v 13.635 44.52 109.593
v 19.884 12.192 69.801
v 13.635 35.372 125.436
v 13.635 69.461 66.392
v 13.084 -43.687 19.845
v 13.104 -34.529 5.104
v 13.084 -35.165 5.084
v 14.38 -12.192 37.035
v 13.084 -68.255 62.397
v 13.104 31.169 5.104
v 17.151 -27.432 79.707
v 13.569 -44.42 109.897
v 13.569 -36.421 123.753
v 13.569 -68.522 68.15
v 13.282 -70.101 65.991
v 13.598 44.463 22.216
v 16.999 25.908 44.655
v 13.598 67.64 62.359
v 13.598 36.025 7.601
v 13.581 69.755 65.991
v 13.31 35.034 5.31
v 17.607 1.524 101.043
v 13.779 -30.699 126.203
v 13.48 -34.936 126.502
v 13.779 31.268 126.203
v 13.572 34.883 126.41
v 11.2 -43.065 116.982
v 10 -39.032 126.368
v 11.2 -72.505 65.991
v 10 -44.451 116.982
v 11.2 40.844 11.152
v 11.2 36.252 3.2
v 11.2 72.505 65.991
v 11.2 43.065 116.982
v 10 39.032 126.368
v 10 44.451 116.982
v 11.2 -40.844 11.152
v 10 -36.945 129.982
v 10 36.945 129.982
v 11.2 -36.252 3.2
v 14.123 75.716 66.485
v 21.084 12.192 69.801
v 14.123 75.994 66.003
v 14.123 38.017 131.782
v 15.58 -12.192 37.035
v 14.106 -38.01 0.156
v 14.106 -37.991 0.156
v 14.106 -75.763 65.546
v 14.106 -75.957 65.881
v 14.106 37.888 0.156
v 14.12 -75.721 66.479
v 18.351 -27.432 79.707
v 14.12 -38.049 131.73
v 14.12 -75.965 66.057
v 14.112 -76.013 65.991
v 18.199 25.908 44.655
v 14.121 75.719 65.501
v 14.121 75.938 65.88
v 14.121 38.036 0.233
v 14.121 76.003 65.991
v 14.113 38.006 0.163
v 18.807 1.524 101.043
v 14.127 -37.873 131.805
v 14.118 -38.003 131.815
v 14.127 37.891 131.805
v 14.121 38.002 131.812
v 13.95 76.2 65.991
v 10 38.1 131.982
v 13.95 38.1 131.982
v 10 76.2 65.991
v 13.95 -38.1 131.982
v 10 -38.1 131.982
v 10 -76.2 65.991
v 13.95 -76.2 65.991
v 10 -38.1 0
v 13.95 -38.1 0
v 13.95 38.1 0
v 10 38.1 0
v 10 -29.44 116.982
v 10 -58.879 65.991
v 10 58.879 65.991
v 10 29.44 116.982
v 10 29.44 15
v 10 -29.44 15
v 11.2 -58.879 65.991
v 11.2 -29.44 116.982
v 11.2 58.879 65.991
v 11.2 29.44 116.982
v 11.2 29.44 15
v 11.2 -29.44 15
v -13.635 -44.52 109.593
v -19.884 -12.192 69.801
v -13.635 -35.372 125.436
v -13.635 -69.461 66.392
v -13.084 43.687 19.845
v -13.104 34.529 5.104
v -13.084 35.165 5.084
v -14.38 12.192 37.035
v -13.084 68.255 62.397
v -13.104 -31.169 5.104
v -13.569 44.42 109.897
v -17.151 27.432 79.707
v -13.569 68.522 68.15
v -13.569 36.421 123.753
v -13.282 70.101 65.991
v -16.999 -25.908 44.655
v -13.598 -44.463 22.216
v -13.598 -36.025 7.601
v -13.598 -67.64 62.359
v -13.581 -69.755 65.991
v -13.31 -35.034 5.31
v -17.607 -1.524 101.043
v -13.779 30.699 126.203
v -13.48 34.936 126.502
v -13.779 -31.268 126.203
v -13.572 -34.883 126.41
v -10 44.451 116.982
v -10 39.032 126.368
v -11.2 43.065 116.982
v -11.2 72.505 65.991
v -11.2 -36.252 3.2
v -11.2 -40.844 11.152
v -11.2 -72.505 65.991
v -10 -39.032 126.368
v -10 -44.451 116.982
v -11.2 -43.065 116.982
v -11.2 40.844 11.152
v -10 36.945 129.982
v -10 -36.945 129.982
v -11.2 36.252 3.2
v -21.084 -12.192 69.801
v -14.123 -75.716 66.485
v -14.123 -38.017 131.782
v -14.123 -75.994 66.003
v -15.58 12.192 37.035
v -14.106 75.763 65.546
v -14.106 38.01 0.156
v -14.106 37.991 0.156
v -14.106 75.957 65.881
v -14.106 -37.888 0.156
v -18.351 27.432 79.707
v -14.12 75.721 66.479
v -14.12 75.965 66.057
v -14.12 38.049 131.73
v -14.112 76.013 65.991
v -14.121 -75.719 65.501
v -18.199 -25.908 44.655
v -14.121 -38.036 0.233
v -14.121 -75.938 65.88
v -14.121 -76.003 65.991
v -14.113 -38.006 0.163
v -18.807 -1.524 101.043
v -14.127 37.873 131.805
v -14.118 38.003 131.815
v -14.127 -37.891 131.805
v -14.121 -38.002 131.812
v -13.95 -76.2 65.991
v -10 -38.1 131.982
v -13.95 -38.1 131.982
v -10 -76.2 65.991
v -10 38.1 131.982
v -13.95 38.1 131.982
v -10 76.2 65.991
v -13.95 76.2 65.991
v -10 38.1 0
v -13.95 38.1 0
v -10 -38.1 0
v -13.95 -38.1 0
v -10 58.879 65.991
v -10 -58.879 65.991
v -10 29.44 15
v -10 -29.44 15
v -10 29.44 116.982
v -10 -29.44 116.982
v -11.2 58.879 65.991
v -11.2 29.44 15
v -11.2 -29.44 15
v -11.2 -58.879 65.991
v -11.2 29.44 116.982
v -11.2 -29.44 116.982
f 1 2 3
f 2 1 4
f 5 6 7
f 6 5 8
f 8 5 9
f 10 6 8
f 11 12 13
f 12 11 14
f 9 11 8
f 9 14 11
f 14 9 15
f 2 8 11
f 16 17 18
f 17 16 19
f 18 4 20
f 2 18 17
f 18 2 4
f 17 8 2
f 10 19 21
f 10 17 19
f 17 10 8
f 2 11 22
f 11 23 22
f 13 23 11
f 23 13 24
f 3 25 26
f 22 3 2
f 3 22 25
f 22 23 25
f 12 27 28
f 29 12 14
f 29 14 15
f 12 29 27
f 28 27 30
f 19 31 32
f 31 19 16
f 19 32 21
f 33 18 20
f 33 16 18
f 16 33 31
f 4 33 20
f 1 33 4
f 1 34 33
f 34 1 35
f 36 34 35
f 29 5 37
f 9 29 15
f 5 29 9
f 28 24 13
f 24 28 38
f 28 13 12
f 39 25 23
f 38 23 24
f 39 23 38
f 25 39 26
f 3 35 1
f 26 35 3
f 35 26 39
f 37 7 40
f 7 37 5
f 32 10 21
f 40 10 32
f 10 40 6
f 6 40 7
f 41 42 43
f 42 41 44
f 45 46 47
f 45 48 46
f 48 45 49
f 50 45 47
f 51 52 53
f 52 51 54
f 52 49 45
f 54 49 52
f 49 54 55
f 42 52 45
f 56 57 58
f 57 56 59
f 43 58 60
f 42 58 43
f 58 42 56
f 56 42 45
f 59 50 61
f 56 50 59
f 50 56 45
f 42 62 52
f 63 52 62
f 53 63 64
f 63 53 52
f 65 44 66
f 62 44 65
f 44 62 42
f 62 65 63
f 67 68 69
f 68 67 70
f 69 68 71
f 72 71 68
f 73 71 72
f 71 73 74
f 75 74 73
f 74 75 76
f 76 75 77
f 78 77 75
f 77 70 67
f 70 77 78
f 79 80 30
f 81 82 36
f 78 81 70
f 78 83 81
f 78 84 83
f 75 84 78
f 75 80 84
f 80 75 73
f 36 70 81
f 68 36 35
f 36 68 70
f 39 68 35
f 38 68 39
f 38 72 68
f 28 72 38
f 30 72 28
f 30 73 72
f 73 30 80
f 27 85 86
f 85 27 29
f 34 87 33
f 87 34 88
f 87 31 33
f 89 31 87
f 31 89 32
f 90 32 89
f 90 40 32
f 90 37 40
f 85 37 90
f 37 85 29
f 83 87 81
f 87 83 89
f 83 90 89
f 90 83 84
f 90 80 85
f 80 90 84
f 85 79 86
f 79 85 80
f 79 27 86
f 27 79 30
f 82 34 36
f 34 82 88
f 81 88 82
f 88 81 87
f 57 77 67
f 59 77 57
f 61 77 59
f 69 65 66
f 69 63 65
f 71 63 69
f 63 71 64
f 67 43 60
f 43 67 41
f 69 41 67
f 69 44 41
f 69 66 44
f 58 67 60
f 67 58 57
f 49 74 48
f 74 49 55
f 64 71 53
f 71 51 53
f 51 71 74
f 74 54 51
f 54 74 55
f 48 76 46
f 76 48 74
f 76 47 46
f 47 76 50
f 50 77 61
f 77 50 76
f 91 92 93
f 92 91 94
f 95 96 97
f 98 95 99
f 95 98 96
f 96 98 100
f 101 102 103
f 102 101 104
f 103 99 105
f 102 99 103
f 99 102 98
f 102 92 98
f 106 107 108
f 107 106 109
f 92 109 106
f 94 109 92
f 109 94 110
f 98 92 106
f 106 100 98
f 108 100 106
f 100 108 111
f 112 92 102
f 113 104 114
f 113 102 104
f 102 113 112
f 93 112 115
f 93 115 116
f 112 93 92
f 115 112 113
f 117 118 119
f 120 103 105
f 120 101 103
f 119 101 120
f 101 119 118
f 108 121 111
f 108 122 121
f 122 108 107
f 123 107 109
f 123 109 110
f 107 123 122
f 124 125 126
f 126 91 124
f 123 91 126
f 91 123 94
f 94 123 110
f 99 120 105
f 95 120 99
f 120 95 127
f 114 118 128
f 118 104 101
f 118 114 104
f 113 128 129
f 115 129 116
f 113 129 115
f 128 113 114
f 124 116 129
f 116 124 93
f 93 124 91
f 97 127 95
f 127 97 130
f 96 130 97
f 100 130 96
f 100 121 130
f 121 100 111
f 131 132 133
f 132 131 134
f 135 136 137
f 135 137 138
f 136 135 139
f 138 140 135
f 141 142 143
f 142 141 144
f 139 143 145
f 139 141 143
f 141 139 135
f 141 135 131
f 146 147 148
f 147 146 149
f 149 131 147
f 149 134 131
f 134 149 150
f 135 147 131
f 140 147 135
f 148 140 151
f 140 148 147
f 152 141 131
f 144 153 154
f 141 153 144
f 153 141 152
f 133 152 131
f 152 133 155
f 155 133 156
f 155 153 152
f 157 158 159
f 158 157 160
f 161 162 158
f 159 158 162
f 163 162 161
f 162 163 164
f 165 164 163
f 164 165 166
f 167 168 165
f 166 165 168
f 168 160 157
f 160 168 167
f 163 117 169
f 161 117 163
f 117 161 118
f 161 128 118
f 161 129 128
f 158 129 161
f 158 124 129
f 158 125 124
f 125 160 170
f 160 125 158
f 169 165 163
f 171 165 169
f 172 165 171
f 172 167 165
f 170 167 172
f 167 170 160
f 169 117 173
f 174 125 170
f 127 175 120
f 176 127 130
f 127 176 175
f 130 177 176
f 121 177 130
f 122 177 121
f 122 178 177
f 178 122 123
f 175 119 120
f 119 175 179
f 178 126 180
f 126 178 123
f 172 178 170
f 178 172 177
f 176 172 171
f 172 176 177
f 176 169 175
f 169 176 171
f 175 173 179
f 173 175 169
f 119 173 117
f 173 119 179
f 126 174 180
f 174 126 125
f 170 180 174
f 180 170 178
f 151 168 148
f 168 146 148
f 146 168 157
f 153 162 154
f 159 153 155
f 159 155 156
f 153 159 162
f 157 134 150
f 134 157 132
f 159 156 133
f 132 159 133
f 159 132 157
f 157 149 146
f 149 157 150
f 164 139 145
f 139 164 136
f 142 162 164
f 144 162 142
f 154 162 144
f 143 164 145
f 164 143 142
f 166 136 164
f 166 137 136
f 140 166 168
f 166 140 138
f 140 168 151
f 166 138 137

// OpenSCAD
/* HEX TILE v72 E1 UNJOINED CONTROL — millimetres.
   Purpose: isolate ONE variable versus the physically printed v72 baseline:
   remove the inter-tile joins while preserving v72 tile geometry.

   DEFAULT: TWO SEPARATE upright 6-inch tiles using v72 geometry.
   No fins, no tacks, no pair connections, no v73/v74 shell changes.

   E1 locked geometry:
     - skin = 1.2 mm
     - front_chamfer = 0.15 mm
     - back_ring_width = 15 mm
     - back_ring_t = 1.2 mm
     - include_top_flange = false

   F5 = preview. F6 = render; then File > Export > STL.
   Geometry checks cannot certify print stability or surface finish.
   OpenSCAD 2026.10.11 + Manifold intended; slicer remains authoritative.
*/

/* [Output] */
output = "separated"; // [separated, single, pair, chain, wall, flat, tabs, section, release_test]
independent_back_gap = 18; // Rear-plane gap. With 10 mm brims, nominal brim overlap = 2 mm.
require_shared_brim = false;  // E1 does not rely on shared/overlapping brims.
minimum_brim_overlap = 1.0;   // Planned overlap between the two independent slicer brims.
inspection_spacing = 18;      // Legacy separated-view spacing.
show_markers = false;         // Preview only; excluded from exported geometry.

/* [Tile geometry] */
size_in = 6;
edge_depth = 4.1;
rim = 2.0;
skin = 1.2; // E1: exact v72 value.
relief_scale = 1.0;
front_chamfer = 0.15; // E1: exact v72 value.

// v74: keep the bed edge square. A chamfer here reduced the first-layer footprint
// and the upright tiles tore away above the brim.
chamfer_bed_edge = true; // E1: match v72; no v74 square-bed-edge override.
back_edge_chamfer = 0; // Keep the wall-facing mounting plane maximally flat.

/* [Open back and wall mounting] */
// E1 preserves v72's 15 mm five-edge flange exactly.
// 15 mm comfortably accepts nominal 1/2 in (12.7 mm) foam mounting tape.
back_ring_width = 15;
back_ring_t = 1.2;

// Keep the broad horizontal top flange omitted for upright printing.
// The other five continuous flange segments grow from supported geometry.
include_top_flange = false;
minimum_front_clearance = 1.2; // E1: exact v72 model guard; actual v72 clearance is 1.70 mm.

/* [Cuttable connections — legacy/regression modes only] */
pair_gap = 2.0;
root_width = 1.0;
root_height = 0.6;
root_overlap = 0.30; // Embed into flange; not a prediction of residual stub height.
neck_width = 0.60;
neck_height = 0.40;
neck_length = 0.40;
tab_pitch = 12; // E1: exact v72 legacy value; unused by separated output.

/* [Layer checks — match slicer] */
layer_height = 0.20;
first_layer_height = 0.20;
line_width = 0.42; // Check only; SCAD cannot set slicer extrusion width/nozzle.
enforce_event_limits = true;
root_event_limit = 2; // Per-pair root transition cap.
all_event_limit = 3;  // Per-pair root + neck transition cap.

// Preserve the established three-pair chain while making its aggregate
// transition budget explicit. Lower only when slicing/printing supports it.
enforce_batch_event_limits = true;
batch_root_event_limit = 6;
batch_all_event_limit = 9;

/* [Batch and bed — conservative rectangular check] */
chain_count = 3;
chain_gap = 6;
bed_width = 256;
bed_depth = 256;
bed_height = 256;
planned_brim = 10; // Used only in fit check; configure the actual brim in slicer.
bed_margin = 5;

/* [Release sample — real lower rim, flange and front skin] */
sample_width = 24;
sample_height = 18;
sample_spacing = 10;

/* [Hidden] */
eps = 0.01;
R = size_in*25.4/2;
AP = R*cos(30);
relief_max = 0.091654*R*relief_scale;
front_max = edge_depth+relief_max;
D = front_max+1;
pair_width = 2*front_max+pair_gap;
N = max(2,ceil(R/tab_pitch));
lo = root_height/2+0.10;
hi = rim-root_height/2;
phase = [0,0,0.18,0.33,0,-0.17];
joined_mode = output=="pair" || output=="chain" || output=="section";
uses_tabs = joined_mode || output=="tabs";
integer_tolerance = 0.0001;

function dot2(a,b) = a[0]*b[0]+a[1]*b[1];
function lerp(a,b,t) = a+(b-a)*t;
function integer_value(x) = abs(x-round(x))<integer_tolerance;

function hex_point(s,inset) =
    let(rr=(AP-inset)/cos(30))
    [rr*cos(60*s),rr*sin(60*s)];

function inset_at(s,i) =
    s==1 ? lerp(lo,hi-0.1,i/(N-1)) :
    s==4 ? lerp(lo+0.1,hi,i/(N-1)) :
    rim/2;

function raw_center(s,i) =
    let(ins=inset_at(s,i),t=(i+0.5+phase[s])/N)
    lerp(hex_point(s,ins),hex_point(s+1,ins),t);

// Root bottom snaps to a BED-ALIGNED layer boundary.
// Its width coordinate remains unchanged.
function bed_layer_index(z) =
    floor((z-first_layer_height)/layer_height+0.5);

function layer_boundary(k) =
    first_layer_height+k*layer_height;

function tab_center(s,i) =
    let(
        p=raw_center(s,i),
        k=bed_layer_index(p[1]+AP-root_height/2)
    )
    [p[0],layer_boundary(k)+root_height/2-AP];

centers = [
    for(s=[0:5],i=[0:N-1])
        tab_center(s,i)
];

function root_bottom_layer(p) =
    bed_layer_index(p[1]+AP-root_height/2);

root_layers = round(root_height/layer_height);
neck_layers = round(neck_height/layer_height);

root_events = [
    for(p=centers,d=[0,root_layers])
        root_bottom_layer(p)+d
];

// Count each distinct transition once per join:
// root start, neck end, root end.
all_events =
    neck_layers==root_layers
    ? root_events
    : [
        for(p=centers,d=[0,neck_layers,root_layers])
            root_bottom_layer(p)+d
    ];

function event_peak(events) =
    max([
        for(k=events)
            len([for(e=events) if(e==k) 1])
    ]);

root_peak = event_peak(root_events);
all_peak = event_peak(all_events);

// For chain output, all independent pairs are aligned and therefore
// transition on the same bed layers. Enforce limits against the full batch.
effective_root_peak = output=="chain" ? root_peak*chain_count : root_peak;
effective_all_peak = output=="chain" ? all_peak*chain_count : all_peak;

within_side_pitch = max([
    for(s=[0:5],i=[0:N-2])
        norm(tab_center(s,i+1)-tab_center(s,i))
]);

corner_pitch = max([
    for(s=[0:5])
        norm(tab_center((s+1)%6,0)-tab_center(s,N-1))
]);

actual_pitch = max(within_side_pitch,corner_pitch);

function rim_distance(p) =
    AP-max([
        for(s=[0:5])
            dot2(p,[cos(30+60*s),sin(30+60*s)])
    ]);

root_corners = [
    for(p=centers,dy=[-1,1],dz=[-1,1])
        p+[dy*root_width/2,dz*root_height/2]
];

root_outer_margin =
    min([for(p=root_corners) rim_distance(p)]);

root_inner_distance =
    max([for(p=root_corners) rim_distance(p)]);

/* Dimension and topology guards */

assert(
    size_in>=3 && size_in<=10,
    "Size must be 3–10 inches"
);

assert(
    edge_depth>0 && skin>0 && relief_scale>0,
    "Invalid body dimensions"
);

assert(
    rim>=1.5 && rim<AP/4,
    "Rim outside supported range"
);

assert(
    back_ring_t>0 &&
    back_ring_width>=0 &&
    back_ring_width<=AP/2,
    "Invalid flange"
);

assert(
    edge_depth-skin-back_ring_t>=minimum_front_clearance,
    "Flange too close to front skin"
);

assert(
    minimum_front_clearance>0,
    "Front clearance must be positive"
);

assert(
    front_chamfer>=0 &&
    front_chamfer<min(rim,edge_depth),
    "Invalid front chamfer"
);

assert(
    back_edge_chamfer>=0 &&
    back_edge_chamfer<min(rim,back_ring_t),
    "Invalid back bevel"
);

assert(
    layer_height>0 &&
    first_layer_height>0 &&
    line_width>0,
    "Invalid slicer check values"
);

assert(
    independent_back_gap>0 && inspection_spacing>=0,
    "Invalid independent/inspection spacing"
);

assert(
    output!="independent" ||
    !require_shared_brim ||
    2*planned_brim-independent_back_gap>=minimum_brim_overlap,
    "Independent output expects overlapping slicer brims: increase planned_brim, reduce independent_back_gap, or disable require_shared_brim"
);

assert(
    pair_gap>=1.5 && pair_gap<=3,
    "Pair gap must be 1.5–3 mm"
);

assert(
    root_height>0 &&
    root_height<=1 &&
    root_width>neck_width &&
    root_width<=1.2,
    "Invalid root"
);

assert(
    neck_width>=line_width &&
    neck_height>=layer_height &&
    neck_height<=root_height,
    "Unprintable neck dimensions"
);

assert(
    neck_length>0 && neck_length<pair_gap,
    "Neck must fit in gap"
);

assert(
    root_overlap>0 && root_overlap<back_ring_t,
    "Root overlap must fit flange thickness"
);

assert(
    integer_value(root_height/layer_height) &&
    integer_value(neck_height/layer_height),
    "Root/neck heights must be whole layers"
);

assert(
    tab_pitch>0 && hi>lo+0.1,
    "Invalid tab spacing or rim allowance"
);

assert(
    !uses_tabs || actual_pitch<=tab_pitch,
    "Actual tab spacing exceeds requested pitch"
);

assert(
    !uses_tabs ||
    (
        root_outer_margin>eps &&
        root_inner_distance<=rim+eps
    ),
    "A root extends outside the supported rim; revise dimensions"
);

assert(
    !joined_mode || back_ring_width>=rim,
    "Joined outputs require a supporting rear perimeter"
);

assert(
    !uses_tabs ||
    !enforce_event_limits ||
    (
        root_peak<=root_event_limit &&
        all_peak<=all_event_limit
    ),
    "Per-pair layer transition burst: adjust layout or deliberately revise limits"
);

assert(
    output!="chain" ||
    !enforce_batch_event_limits ||
    (
        effective_root_peak<=batch_root_event_limit &&
        effective_all_peak<=batch_all_event_limit
    ),
    "Whole-chain layer transition burst: reduce chain count or revise batch limits deliberately"
);

assert(
    integer_value(chain_count) &&
    chain_count>=1 &&
    chain_count<=8,
    "Batch count must be integer 1–8"
);

assert(
    chain_gap>0,
    "Invalid chain spacing"
);

assert(
    output!="release_test" ||
    (
        sample_width>=root_width+4 &&
        sample_width<R &&
        sample_height>8 &&
        sample_height<AP/2
    ),
    "Invalid sample dimensions"
);

assert(
    back_ring_width>=4 || output!="release_test",
    "Sample needs at least 4 mm structural rear perimeter"
);

assert(
    planned_brim>=0 &&
    bed_margin>=0 &&
    min(bed_width,bed_depth,bed_height)>0,
    "Invalid bed check"
);

assert(
    output=="independent" ||
    output=="single" ||
    output=="pair" ||
    output=="chain" ||
    output=="wall" ||
    output=="flat" ||
    output=="separated" ||
    output=="tabs" ||
    output=="section" ||
    output=="release_test",
    "Unknown output"
);

/* Conservative layout bounds.
   Includes planned brim and margins.
   Does not model printer exclusion zones. */

layout_x =
    output=="chain"
        ? chain_count*pair_width+(chain_count-1)*chain_gap :
    output=="release_test"
        ? 3*pair_width+2*sample_spacing :
    output=="flat"
        ? 2*R :
    output=="wall" || output=="single"
        ? front_max :
    output=="independent"
        ? 2*front_max+independent_back_gap :
    output=="separated"
        ? pair_width+inspection_spacing :
    pair_width;

layout_y =
    output=="release_test"
        ? sample_width :
    output=="flat"
        ? 2*AP :
    2*R;

layout_z =
    output=="release_test"
        ? sample_height :
    output=="flat"
        ? front_max :
    2*AP;

print_layout =
    output=="independent" ||
    output=="single" ||
    output=="pair" ||
    output=="chain" ||
    output=="wall" ||
    output=="flat" ||
    output=="separated" ||
    output=="tabs" ||
    output=="section" ||
    output=="release_test";

assert(
    !print_layout ||
    (
        layout_x+2*(planned_brim+bed_margin)<=bed_width &&
        layout_y+2*(planned_brim+bed_margin)<=bed_depth &&
        layout_z<=bed_height
    ),
    "Layout plus brim/margin exceeds bed; resize or reduce batch count"
);

echo(str(
    "v72 E1 unjoined control | ",output,
    " | ",6*N," joins/pair in legacy joined modes",
    " | max actual pitch ",actual_pitch," mm"
));

echo(str(
    "Rear mount: ",back_ring_width," mm continuous five-edge flange x ",back_ring_t," mm thick",
    " | top mounting band omitted=",!include_top_flange
));

if(output=="independent")
    echo(str(
        "Independent rear-plane gap=",independent_back_gap," mm",
        " | planned brim=",planned_brim," mm",
        " | nominal center brim overlap=",max(0,2*planned_brim-independent_back_gap)," mm"
    ));

echo(str(
    "BED-ALIGNED transitions: pair root=",root_peak,
    "; pair including neck=",all_peak,
    "; effective root=",effective_root_peak,
    "; effective including neck=",effective_all_peak
));

if(output=="chain")
    echo(str(
        "Chain contains ",chain_count,
        " independent legacy pairs; aggregate caps root=",batch_root_event_limit,
        ", including neck=",batch_all_event_limit,"."
    ));

if(output=="flat")
    echo(
        "Flat mode is inspection/export only until support/bridging behavior is validated."
    );

if(include_top_flange)
    echo(
        "Full top flange enabled: inspect unsupported starts in the actual slice."
    );

/* Native front geometry.
   Inherited v30/v57 low-poly facet topology.
   Coordinates are normalized to the corner radius. */

FP = [
    [ 1.00,  0.000000, 0.000000],
    [ 0.50,  0.866025, 0.000000],
    [-0.50,  0.866025, 0.000000],
    [-1.00,  0.000000, 0.000000],
    [-0.50, -0.866025, 0.000000],
    [ 0.50, -0.866025, 0.000000],
    [ 0.16,  0.050000, 0.091654],
    [-0.16, -0.380000, 0.019428],
    [-0.36,  0.180000, 0.055790],
    [ 0.34, -0.280000, 0.053795],
    [ 0.02,  0.460000, 0.061766]
];

FACES = [
    [0,6,1],
    [4,3,7],
    [5,4,7],
    [8,3,2],
    [7,3,8],
    [7,8,6],
    [5,9,0],
    [9,6,0],
    [9,7,6],
    [5,7,9],
    [6,8,10],
    [8,2,10],
    [6,10,1],
    [10,2,1],
    [1,12,11,0],
    [2,13,12,1],
    [3,14,13,2],
    [4,15,14,3],
    [5,16,15,4],
    [0,11,16,5],
    [11,12,13,14,15,16]
];

module hex2d(a) {
    circle(r=a/cos(30),$fn=6);
}

module faceted_solid(dz=0,zb=0) {
    polyhedron(
        points=concat(
            [
                for(p=FP)
                    [
                        p[0]*R,
                        p[1]*R,
                        edge_depth+p[2]*R*relief_scale+dz
                    ]
            ],
            [
                for(i=[0:5])
                    [FP[i][0]*R,FP[i][1]*R,zb]
            ]
        ),
        faces=FACES,
        convexity=12
    );
}

module cavity() {
    H = D+2;
    a = AP-rim+1;

    assert(
        a>H,
        "Size too small for requested cavity depth"
    );

    intersection() {
        faceted_solid(-skin,-1);

        translate([0,0,-1])
            linear_extrude(H,scale=(a-H)/a)
                hex2d(a);
    }
}

module front_envelope() {
    H = D+5;

    union() {
        translate([0,0,-eps])
            linear_extrude(
                edge_depth-front_chamfer+eps
            )
                hex2d(AP+eps);

        translate([0,0,edge_depth-front_chamfer])
            linear_extrude(
                H,
                scale=(AP-H)/AP
            )
                hex2d(AP);

        // Local -Y flat is the bed edge once upright (Z = local Y).
        if(!chamfer_bed_edge)
            translate([-R-1,-AP-1,-1])
                cube([2*R+2,1+front_chamfer,D+7]);
    }
}

// Keeps the interior while beveling the outside.
// Unlike v68, this does not subtract the center.
module back_envelope() {
    union() {
        linear_extrude(
            back_edge_chamfer,
            scale=AP/(AP-back_edge_chamfer)
        )
            hex2d(AP-back_edge_chamfer);

        translate([0,0,back_edge_chamfer])
            linear_extrude(D+1)
                hex2d(AP);
    }
}

// v72-style continuous five-edge flange. This is intentionally simple and
// physically grounded: no local pads, fins, tacks or removable model features.
module tape_flange() {
    if(back_ring_width>0)
        linear_extrude(back_ring_t)
            intersection() {
                difference() {
                    hex2d(AP);
                    hex2d(AP-back_ring_width);
                }

                // Preserve v72's proven open-top upright-print behavior.
                if(!include_top_flange)
                    translate([-2*R,-2*AP])
                        square([
                            4*R,
                            3*AP-back_ring_width
                        ]);
            }
}

module tile() {
    intersection() {
        union() {
            difference() {
                faceted_solid();
                cavity();
            }

            tape_flange();
        }

        if(front_chamfer>0)
            front_envelope();
        else
            faceted_solid();

        if(back_edge_chamfer>0)
            back_envelope();
        else
            faceted_solid();
    }
}

// Canonical frame:
// X = depth, Y = tile width, Z = height.
// Back/wall plane is X=0.
module oriented_tile() {
    multmatrix([
        [0,0,1,0],
        [1,0,0,0],
        [0,1,0,0],
        [0,0,0,1]
    ])
        tile();
}

module first_tile() {
    translate([pair_gap/2,0,0])
        oriented_tile();
}

module partner_tile() {
    rotate([0,0,180])
        first_tile();
}

module bodies() {
    first_tile();
    partner_tile();
}

module connection(h=neck_height) {
    assert(
        h>0 &&
        h<=root_height+integer_tolerance &&
        integer_value(h/layer_height),
        "Sample neck must fit the root in whole layers"
    );

    // Shared bottom plane. Short arms taper toward the cuttable middle.
    bottom = -root_height/2;

    for(sign=[-1,1])
        hull() {
            translate([
                sign*(pair_gap/2+root_overlap/2),
                0,
                bottom+root_height/2
            ])
                cube([
                    root_overlap,
                    root_width,
                    root_height
                ],center=true);

            translate([
                sign*neck_length/2,
                0,
                bottom+h/2
            ])
                cube([
                    eps,
                    neck_width,
                    h
                ],center=true);
        }

    translate([0,0,bottom+h/2])
        cube([
            neck_length+eps,
            neck_width,
            h
        ],center=true);
}

module tabs() {
    for(p=centers)
        translate([0,p[0],p[1]])
            connection();
}

module pair_model() {
    union() {
        bodies();
        tabs();
    }
}

module chain_model() {
    for(i=[0:chain_count-1])
        translate([
            (i-(chain_count-1)/2)*
            (pair_width+chain_gap),
            0,
            0
        ])
            pair_model();
}

// Two independent production tiles. Their rear/wall planes are separated by
// independent_back_gap. The models never touch; any shared base comes only
// from the slicer's removable brim.
module independent_model() {
    color("#e9a480")
        translate([ independent_back_gap/2,0,0])
            oriented_tile();

    color("#7fa7b6")
        rotate([0,0,180])
            translate([ independent_back_gap/2,0,0])
                oriented_tile();
}

// Retained as a legacy visual/inspection alias with its own spacing control.
module separated_model() {
    color("#e9a480")
        translate([inspection_spacing/2,0,0])
            first_tile();

    color("#7fa7b6")
        translate([-inspection_spacing/2,0,0])
            partner_tile();
}

module upright() {
    translate([0,0,AP])
        children();
}

module release_sample(h) {
    // A cropped section of the actual lower rim, rear mounting geometry,
    // cavity and visible front skin; one join at a layer-aligned height.
    sample_join_z =
        first_layer_height+
        round(2/layer_height)*layer_height;

    union() {
        intersection() {
            upright()
                bodies();

            translate([
                -pair_width/2-eps,
                -sample_width/2,
                0
            ])
                cube([
                    pair_width+2*eps,
                    sample_width,
                    sample_height
                ]);
        }

        translate([
            0,
            0,
            sample_join_z+root_height/2
        ])
            connection(h);
    }
}

module release_test_plate() {
    // Left to right: one-, two-, three-layer necks.
    for(i=[0:2])
        translate([
            (i-1)*(pair_width+sample_spacing),
            0,
            0
        ])
            release_sample((i+1)*layer_height);
}

/* Output selection */

if(output=="flat")
    tile();

else if(output=="release_test")
    release_test_plate();

else
    upright() {
        if(output=="independent")
            independent_model();

        else if(output=="single")
            oriented_tile();

        else if(output=="pair")
            pair_model();

        else if(output=="chain")
            chain_model();

        else if(output=="wall")
            oriented_tile();

        else if(output=="separated")
            separated_model();

        else if(output=="tabs")
            tabs();

        else if(output=="section")
            intersection() {
                pair_model();

                translate([
                    -pair_width,
                    -0.5,
                    -2*AP
                ])
                    cube([
                        2*pair_width,
                        1,
                        4*AP
                    ]);
            }

        if(
            $preview &&
            show_markers &&
            output!="wall" &&
            output!="single" &&
            output!="independent"
        )
            for(p=centers)
                %color("red")
                    translate([0,p[0],p[1]])
                        sphere(r=1,$fn=16);
    }
